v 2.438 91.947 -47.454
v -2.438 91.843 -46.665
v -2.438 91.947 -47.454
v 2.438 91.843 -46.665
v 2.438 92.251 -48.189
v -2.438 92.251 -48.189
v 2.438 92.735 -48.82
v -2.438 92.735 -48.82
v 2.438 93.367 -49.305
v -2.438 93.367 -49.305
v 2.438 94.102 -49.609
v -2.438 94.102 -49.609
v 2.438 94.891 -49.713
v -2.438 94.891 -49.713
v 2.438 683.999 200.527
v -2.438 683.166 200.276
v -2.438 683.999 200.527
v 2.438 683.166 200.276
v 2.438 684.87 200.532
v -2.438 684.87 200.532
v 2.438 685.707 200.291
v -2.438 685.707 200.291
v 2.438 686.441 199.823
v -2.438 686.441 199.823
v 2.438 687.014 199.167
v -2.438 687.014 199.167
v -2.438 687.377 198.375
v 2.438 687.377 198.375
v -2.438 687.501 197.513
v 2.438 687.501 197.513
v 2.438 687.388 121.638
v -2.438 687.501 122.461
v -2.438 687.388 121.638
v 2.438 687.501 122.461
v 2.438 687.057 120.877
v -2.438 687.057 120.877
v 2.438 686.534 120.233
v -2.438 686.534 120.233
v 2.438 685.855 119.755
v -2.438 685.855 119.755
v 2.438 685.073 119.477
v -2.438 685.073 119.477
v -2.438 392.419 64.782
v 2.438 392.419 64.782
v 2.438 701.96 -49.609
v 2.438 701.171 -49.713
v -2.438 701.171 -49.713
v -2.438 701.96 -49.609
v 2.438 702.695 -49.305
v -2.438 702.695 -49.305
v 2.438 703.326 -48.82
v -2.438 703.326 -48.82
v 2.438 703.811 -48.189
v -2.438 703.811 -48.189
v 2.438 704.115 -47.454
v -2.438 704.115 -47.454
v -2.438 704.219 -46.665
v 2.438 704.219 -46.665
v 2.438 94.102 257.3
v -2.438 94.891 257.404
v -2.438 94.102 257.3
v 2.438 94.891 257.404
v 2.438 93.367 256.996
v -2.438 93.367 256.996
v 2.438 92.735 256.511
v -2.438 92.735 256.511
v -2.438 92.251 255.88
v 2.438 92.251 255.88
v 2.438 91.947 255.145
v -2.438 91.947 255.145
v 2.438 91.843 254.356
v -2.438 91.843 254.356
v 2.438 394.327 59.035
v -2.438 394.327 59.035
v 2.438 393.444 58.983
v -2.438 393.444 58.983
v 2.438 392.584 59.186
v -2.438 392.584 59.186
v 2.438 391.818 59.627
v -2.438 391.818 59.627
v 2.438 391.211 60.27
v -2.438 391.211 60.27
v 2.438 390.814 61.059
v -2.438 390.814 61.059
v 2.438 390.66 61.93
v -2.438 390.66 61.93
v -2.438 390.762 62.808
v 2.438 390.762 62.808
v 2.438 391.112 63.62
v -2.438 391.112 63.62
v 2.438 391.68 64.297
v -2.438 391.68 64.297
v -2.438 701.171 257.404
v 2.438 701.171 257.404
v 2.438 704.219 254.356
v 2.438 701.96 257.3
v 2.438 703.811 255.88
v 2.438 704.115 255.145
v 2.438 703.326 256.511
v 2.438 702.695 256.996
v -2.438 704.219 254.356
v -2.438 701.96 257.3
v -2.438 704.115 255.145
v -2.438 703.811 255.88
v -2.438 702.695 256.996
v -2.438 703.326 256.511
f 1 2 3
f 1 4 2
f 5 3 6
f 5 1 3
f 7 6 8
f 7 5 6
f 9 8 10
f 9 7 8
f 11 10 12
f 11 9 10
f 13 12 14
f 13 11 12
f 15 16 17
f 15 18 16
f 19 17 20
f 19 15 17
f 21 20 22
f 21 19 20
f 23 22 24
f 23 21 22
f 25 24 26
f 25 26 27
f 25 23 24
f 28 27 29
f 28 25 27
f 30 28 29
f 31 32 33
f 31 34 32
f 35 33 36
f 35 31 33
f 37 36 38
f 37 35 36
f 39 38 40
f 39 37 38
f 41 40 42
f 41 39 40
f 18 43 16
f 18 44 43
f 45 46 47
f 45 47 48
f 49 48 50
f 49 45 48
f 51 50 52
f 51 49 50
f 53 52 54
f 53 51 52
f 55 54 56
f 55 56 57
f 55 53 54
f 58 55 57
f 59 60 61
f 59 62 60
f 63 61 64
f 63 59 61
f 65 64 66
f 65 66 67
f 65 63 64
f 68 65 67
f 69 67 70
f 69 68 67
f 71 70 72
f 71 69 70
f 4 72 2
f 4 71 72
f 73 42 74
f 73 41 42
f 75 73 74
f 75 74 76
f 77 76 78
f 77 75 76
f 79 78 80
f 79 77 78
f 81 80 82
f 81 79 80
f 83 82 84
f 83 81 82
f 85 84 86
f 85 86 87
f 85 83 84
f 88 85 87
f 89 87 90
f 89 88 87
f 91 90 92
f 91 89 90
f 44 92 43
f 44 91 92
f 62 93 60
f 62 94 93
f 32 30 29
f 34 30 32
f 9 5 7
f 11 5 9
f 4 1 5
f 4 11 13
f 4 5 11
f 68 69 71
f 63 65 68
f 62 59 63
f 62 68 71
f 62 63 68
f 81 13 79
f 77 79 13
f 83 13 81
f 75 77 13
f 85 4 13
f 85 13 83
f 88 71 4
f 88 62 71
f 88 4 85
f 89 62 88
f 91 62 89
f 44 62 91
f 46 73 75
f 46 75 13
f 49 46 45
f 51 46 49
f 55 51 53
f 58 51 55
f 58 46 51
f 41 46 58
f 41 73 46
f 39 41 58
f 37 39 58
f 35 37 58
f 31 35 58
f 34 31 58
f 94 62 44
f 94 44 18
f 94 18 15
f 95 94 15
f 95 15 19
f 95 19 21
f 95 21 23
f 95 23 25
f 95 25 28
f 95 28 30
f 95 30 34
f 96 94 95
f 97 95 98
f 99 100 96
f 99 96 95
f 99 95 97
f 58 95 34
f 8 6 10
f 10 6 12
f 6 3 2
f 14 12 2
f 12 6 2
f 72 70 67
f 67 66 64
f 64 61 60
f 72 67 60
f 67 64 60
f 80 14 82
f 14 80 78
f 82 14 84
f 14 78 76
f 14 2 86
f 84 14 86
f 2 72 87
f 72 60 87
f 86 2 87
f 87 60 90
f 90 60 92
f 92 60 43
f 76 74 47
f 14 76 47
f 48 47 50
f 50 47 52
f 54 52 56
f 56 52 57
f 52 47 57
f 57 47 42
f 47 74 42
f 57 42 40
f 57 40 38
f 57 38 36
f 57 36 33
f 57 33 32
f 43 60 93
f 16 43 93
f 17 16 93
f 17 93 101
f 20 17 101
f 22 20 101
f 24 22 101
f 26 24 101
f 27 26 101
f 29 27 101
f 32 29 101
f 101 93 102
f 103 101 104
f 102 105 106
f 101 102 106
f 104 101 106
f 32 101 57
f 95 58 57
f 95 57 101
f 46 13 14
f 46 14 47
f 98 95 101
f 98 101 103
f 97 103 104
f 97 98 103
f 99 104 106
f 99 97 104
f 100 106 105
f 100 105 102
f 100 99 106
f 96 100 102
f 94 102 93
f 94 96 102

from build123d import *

# Parameters (mm, degrees)
F1_DEPTH = 0.2032
F2_SCALE = 12


with BuildPart() as f1:
    # F0 (on Right) → F1 (new body, symmetric)
    with BuildSketch(Plane.YZ):
        with BuildLine():
            ThreePointArc((7.6535586268, -3.8887472606), (7.7279535043, -4.0683523831), (7.9075586268, -4.1427472606))
            Line((7.9075586268, -4.1427472606), (58.4309190295, -4.1427472606))
            ThreePointArc((58.4309190295, -4.1427472606), (58.6105241519, -4.0683523831), (58.6849190295, -3.8887472606))
            Line((58.6849190295, -3.8887472606), (58.6849190295, 21.1963314346))
            ThreePointArc((58.6849190295, 21.1963314346), (58.6105241519, 21.375936557), (58.4309190295, 21.4503314346))
            Line((58.4309190295, 21.4503314346), (7.9075586268, 21.4503314346))
            ThreePointArc((7.9075586268, 21.4503314346), (7.7279535043, 21.375936557), (7.6535586268, 21.1963314346))
            Line((7.6535586268, 21.1963314346), (7.6535586268, -3.8887472606))
        make_face()
        with BuildLine():
            ThreePointArc((32.8605727571, 4.9196215098), (32.5678123501, 5.0882773482), (32.7015852855, 5.3985324844))
            Line((32.7015852855, 5.3985324844), (56.9304593399, 16.6896579893))
            ThreePointArc((56.9304593399, 16.6896579893), (57.1742493276, 16.6736356668), (57.2917498648, 16.4594303992))
            Line((57.2917498648, 16.4594303992), (57.2917498648, 10.2050660498))
            ThreePointArc((57.2917498648, 10.2050660498), (57.2347866945, 10.0447772861), (57.0894468115, 9.9563826653))
            Line((57.0894468115, 9.9563826653), (32.8605727571, 4.9196215098))
        make_face(mode=Mode.SUBTRACT)
    extrude(amount=F1_DEPTH, both=True)


with BuildPart() as f1_1:
    # F2: moved
    add(f1.part.scale(F2_SCALE))


solid = f1_1.part
